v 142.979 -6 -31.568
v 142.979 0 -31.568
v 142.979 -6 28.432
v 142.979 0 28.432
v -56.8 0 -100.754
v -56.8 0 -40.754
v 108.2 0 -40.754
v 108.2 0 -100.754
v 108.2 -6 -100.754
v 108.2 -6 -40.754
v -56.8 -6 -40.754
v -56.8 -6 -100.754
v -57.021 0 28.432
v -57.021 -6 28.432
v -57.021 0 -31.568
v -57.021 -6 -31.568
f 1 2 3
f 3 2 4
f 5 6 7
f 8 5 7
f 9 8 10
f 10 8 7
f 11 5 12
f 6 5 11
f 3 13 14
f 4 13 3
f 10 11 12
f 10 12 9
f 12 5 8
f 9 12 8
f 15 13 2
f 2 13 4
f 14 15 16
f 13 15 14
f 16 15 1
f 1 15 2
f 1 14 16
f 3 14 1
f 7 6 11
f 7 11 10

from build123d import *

# Parameters (mm, degrees)
F0_W     = 200
F0_H     = 60
F1_DEPTH = 6
F2_DEPTH = 6
F0_W_2   = 165


# Not quite as in the source:
# - a feature names something its author has since deleted; it is built from what else it names


with BuildPart() as f1:
    # F0 (on Front) → F1 (new body)
    with BuildSketch(Plane.XZ):
        with Locations((42.9789469411, -1.5680367857)):
            Rectangle(F0_W, F0_H)
    extrude(amount=F1_DEPTH)

    # F0 (on Front) → F2 (join)
    with BuildSketch(Plane.XZ):
        with Locations((42.9789469411, -1.5680367857)):
            Rectangle(F0_W, F0_H)
    extrude(amount=F2_DEPTH)


with BuildPart() as f2:
    # F0 (on Front) → F2, piece 2 (new body)
    with BuildSketch(Plane.XZ):
        with Locations((25.7003870606, -70.753903389)):
            Rectangle(F0_W_2, F0_H)
    extrude(amount=F2_DEPTH)


solid = Compound([f1.part, f2.part])
